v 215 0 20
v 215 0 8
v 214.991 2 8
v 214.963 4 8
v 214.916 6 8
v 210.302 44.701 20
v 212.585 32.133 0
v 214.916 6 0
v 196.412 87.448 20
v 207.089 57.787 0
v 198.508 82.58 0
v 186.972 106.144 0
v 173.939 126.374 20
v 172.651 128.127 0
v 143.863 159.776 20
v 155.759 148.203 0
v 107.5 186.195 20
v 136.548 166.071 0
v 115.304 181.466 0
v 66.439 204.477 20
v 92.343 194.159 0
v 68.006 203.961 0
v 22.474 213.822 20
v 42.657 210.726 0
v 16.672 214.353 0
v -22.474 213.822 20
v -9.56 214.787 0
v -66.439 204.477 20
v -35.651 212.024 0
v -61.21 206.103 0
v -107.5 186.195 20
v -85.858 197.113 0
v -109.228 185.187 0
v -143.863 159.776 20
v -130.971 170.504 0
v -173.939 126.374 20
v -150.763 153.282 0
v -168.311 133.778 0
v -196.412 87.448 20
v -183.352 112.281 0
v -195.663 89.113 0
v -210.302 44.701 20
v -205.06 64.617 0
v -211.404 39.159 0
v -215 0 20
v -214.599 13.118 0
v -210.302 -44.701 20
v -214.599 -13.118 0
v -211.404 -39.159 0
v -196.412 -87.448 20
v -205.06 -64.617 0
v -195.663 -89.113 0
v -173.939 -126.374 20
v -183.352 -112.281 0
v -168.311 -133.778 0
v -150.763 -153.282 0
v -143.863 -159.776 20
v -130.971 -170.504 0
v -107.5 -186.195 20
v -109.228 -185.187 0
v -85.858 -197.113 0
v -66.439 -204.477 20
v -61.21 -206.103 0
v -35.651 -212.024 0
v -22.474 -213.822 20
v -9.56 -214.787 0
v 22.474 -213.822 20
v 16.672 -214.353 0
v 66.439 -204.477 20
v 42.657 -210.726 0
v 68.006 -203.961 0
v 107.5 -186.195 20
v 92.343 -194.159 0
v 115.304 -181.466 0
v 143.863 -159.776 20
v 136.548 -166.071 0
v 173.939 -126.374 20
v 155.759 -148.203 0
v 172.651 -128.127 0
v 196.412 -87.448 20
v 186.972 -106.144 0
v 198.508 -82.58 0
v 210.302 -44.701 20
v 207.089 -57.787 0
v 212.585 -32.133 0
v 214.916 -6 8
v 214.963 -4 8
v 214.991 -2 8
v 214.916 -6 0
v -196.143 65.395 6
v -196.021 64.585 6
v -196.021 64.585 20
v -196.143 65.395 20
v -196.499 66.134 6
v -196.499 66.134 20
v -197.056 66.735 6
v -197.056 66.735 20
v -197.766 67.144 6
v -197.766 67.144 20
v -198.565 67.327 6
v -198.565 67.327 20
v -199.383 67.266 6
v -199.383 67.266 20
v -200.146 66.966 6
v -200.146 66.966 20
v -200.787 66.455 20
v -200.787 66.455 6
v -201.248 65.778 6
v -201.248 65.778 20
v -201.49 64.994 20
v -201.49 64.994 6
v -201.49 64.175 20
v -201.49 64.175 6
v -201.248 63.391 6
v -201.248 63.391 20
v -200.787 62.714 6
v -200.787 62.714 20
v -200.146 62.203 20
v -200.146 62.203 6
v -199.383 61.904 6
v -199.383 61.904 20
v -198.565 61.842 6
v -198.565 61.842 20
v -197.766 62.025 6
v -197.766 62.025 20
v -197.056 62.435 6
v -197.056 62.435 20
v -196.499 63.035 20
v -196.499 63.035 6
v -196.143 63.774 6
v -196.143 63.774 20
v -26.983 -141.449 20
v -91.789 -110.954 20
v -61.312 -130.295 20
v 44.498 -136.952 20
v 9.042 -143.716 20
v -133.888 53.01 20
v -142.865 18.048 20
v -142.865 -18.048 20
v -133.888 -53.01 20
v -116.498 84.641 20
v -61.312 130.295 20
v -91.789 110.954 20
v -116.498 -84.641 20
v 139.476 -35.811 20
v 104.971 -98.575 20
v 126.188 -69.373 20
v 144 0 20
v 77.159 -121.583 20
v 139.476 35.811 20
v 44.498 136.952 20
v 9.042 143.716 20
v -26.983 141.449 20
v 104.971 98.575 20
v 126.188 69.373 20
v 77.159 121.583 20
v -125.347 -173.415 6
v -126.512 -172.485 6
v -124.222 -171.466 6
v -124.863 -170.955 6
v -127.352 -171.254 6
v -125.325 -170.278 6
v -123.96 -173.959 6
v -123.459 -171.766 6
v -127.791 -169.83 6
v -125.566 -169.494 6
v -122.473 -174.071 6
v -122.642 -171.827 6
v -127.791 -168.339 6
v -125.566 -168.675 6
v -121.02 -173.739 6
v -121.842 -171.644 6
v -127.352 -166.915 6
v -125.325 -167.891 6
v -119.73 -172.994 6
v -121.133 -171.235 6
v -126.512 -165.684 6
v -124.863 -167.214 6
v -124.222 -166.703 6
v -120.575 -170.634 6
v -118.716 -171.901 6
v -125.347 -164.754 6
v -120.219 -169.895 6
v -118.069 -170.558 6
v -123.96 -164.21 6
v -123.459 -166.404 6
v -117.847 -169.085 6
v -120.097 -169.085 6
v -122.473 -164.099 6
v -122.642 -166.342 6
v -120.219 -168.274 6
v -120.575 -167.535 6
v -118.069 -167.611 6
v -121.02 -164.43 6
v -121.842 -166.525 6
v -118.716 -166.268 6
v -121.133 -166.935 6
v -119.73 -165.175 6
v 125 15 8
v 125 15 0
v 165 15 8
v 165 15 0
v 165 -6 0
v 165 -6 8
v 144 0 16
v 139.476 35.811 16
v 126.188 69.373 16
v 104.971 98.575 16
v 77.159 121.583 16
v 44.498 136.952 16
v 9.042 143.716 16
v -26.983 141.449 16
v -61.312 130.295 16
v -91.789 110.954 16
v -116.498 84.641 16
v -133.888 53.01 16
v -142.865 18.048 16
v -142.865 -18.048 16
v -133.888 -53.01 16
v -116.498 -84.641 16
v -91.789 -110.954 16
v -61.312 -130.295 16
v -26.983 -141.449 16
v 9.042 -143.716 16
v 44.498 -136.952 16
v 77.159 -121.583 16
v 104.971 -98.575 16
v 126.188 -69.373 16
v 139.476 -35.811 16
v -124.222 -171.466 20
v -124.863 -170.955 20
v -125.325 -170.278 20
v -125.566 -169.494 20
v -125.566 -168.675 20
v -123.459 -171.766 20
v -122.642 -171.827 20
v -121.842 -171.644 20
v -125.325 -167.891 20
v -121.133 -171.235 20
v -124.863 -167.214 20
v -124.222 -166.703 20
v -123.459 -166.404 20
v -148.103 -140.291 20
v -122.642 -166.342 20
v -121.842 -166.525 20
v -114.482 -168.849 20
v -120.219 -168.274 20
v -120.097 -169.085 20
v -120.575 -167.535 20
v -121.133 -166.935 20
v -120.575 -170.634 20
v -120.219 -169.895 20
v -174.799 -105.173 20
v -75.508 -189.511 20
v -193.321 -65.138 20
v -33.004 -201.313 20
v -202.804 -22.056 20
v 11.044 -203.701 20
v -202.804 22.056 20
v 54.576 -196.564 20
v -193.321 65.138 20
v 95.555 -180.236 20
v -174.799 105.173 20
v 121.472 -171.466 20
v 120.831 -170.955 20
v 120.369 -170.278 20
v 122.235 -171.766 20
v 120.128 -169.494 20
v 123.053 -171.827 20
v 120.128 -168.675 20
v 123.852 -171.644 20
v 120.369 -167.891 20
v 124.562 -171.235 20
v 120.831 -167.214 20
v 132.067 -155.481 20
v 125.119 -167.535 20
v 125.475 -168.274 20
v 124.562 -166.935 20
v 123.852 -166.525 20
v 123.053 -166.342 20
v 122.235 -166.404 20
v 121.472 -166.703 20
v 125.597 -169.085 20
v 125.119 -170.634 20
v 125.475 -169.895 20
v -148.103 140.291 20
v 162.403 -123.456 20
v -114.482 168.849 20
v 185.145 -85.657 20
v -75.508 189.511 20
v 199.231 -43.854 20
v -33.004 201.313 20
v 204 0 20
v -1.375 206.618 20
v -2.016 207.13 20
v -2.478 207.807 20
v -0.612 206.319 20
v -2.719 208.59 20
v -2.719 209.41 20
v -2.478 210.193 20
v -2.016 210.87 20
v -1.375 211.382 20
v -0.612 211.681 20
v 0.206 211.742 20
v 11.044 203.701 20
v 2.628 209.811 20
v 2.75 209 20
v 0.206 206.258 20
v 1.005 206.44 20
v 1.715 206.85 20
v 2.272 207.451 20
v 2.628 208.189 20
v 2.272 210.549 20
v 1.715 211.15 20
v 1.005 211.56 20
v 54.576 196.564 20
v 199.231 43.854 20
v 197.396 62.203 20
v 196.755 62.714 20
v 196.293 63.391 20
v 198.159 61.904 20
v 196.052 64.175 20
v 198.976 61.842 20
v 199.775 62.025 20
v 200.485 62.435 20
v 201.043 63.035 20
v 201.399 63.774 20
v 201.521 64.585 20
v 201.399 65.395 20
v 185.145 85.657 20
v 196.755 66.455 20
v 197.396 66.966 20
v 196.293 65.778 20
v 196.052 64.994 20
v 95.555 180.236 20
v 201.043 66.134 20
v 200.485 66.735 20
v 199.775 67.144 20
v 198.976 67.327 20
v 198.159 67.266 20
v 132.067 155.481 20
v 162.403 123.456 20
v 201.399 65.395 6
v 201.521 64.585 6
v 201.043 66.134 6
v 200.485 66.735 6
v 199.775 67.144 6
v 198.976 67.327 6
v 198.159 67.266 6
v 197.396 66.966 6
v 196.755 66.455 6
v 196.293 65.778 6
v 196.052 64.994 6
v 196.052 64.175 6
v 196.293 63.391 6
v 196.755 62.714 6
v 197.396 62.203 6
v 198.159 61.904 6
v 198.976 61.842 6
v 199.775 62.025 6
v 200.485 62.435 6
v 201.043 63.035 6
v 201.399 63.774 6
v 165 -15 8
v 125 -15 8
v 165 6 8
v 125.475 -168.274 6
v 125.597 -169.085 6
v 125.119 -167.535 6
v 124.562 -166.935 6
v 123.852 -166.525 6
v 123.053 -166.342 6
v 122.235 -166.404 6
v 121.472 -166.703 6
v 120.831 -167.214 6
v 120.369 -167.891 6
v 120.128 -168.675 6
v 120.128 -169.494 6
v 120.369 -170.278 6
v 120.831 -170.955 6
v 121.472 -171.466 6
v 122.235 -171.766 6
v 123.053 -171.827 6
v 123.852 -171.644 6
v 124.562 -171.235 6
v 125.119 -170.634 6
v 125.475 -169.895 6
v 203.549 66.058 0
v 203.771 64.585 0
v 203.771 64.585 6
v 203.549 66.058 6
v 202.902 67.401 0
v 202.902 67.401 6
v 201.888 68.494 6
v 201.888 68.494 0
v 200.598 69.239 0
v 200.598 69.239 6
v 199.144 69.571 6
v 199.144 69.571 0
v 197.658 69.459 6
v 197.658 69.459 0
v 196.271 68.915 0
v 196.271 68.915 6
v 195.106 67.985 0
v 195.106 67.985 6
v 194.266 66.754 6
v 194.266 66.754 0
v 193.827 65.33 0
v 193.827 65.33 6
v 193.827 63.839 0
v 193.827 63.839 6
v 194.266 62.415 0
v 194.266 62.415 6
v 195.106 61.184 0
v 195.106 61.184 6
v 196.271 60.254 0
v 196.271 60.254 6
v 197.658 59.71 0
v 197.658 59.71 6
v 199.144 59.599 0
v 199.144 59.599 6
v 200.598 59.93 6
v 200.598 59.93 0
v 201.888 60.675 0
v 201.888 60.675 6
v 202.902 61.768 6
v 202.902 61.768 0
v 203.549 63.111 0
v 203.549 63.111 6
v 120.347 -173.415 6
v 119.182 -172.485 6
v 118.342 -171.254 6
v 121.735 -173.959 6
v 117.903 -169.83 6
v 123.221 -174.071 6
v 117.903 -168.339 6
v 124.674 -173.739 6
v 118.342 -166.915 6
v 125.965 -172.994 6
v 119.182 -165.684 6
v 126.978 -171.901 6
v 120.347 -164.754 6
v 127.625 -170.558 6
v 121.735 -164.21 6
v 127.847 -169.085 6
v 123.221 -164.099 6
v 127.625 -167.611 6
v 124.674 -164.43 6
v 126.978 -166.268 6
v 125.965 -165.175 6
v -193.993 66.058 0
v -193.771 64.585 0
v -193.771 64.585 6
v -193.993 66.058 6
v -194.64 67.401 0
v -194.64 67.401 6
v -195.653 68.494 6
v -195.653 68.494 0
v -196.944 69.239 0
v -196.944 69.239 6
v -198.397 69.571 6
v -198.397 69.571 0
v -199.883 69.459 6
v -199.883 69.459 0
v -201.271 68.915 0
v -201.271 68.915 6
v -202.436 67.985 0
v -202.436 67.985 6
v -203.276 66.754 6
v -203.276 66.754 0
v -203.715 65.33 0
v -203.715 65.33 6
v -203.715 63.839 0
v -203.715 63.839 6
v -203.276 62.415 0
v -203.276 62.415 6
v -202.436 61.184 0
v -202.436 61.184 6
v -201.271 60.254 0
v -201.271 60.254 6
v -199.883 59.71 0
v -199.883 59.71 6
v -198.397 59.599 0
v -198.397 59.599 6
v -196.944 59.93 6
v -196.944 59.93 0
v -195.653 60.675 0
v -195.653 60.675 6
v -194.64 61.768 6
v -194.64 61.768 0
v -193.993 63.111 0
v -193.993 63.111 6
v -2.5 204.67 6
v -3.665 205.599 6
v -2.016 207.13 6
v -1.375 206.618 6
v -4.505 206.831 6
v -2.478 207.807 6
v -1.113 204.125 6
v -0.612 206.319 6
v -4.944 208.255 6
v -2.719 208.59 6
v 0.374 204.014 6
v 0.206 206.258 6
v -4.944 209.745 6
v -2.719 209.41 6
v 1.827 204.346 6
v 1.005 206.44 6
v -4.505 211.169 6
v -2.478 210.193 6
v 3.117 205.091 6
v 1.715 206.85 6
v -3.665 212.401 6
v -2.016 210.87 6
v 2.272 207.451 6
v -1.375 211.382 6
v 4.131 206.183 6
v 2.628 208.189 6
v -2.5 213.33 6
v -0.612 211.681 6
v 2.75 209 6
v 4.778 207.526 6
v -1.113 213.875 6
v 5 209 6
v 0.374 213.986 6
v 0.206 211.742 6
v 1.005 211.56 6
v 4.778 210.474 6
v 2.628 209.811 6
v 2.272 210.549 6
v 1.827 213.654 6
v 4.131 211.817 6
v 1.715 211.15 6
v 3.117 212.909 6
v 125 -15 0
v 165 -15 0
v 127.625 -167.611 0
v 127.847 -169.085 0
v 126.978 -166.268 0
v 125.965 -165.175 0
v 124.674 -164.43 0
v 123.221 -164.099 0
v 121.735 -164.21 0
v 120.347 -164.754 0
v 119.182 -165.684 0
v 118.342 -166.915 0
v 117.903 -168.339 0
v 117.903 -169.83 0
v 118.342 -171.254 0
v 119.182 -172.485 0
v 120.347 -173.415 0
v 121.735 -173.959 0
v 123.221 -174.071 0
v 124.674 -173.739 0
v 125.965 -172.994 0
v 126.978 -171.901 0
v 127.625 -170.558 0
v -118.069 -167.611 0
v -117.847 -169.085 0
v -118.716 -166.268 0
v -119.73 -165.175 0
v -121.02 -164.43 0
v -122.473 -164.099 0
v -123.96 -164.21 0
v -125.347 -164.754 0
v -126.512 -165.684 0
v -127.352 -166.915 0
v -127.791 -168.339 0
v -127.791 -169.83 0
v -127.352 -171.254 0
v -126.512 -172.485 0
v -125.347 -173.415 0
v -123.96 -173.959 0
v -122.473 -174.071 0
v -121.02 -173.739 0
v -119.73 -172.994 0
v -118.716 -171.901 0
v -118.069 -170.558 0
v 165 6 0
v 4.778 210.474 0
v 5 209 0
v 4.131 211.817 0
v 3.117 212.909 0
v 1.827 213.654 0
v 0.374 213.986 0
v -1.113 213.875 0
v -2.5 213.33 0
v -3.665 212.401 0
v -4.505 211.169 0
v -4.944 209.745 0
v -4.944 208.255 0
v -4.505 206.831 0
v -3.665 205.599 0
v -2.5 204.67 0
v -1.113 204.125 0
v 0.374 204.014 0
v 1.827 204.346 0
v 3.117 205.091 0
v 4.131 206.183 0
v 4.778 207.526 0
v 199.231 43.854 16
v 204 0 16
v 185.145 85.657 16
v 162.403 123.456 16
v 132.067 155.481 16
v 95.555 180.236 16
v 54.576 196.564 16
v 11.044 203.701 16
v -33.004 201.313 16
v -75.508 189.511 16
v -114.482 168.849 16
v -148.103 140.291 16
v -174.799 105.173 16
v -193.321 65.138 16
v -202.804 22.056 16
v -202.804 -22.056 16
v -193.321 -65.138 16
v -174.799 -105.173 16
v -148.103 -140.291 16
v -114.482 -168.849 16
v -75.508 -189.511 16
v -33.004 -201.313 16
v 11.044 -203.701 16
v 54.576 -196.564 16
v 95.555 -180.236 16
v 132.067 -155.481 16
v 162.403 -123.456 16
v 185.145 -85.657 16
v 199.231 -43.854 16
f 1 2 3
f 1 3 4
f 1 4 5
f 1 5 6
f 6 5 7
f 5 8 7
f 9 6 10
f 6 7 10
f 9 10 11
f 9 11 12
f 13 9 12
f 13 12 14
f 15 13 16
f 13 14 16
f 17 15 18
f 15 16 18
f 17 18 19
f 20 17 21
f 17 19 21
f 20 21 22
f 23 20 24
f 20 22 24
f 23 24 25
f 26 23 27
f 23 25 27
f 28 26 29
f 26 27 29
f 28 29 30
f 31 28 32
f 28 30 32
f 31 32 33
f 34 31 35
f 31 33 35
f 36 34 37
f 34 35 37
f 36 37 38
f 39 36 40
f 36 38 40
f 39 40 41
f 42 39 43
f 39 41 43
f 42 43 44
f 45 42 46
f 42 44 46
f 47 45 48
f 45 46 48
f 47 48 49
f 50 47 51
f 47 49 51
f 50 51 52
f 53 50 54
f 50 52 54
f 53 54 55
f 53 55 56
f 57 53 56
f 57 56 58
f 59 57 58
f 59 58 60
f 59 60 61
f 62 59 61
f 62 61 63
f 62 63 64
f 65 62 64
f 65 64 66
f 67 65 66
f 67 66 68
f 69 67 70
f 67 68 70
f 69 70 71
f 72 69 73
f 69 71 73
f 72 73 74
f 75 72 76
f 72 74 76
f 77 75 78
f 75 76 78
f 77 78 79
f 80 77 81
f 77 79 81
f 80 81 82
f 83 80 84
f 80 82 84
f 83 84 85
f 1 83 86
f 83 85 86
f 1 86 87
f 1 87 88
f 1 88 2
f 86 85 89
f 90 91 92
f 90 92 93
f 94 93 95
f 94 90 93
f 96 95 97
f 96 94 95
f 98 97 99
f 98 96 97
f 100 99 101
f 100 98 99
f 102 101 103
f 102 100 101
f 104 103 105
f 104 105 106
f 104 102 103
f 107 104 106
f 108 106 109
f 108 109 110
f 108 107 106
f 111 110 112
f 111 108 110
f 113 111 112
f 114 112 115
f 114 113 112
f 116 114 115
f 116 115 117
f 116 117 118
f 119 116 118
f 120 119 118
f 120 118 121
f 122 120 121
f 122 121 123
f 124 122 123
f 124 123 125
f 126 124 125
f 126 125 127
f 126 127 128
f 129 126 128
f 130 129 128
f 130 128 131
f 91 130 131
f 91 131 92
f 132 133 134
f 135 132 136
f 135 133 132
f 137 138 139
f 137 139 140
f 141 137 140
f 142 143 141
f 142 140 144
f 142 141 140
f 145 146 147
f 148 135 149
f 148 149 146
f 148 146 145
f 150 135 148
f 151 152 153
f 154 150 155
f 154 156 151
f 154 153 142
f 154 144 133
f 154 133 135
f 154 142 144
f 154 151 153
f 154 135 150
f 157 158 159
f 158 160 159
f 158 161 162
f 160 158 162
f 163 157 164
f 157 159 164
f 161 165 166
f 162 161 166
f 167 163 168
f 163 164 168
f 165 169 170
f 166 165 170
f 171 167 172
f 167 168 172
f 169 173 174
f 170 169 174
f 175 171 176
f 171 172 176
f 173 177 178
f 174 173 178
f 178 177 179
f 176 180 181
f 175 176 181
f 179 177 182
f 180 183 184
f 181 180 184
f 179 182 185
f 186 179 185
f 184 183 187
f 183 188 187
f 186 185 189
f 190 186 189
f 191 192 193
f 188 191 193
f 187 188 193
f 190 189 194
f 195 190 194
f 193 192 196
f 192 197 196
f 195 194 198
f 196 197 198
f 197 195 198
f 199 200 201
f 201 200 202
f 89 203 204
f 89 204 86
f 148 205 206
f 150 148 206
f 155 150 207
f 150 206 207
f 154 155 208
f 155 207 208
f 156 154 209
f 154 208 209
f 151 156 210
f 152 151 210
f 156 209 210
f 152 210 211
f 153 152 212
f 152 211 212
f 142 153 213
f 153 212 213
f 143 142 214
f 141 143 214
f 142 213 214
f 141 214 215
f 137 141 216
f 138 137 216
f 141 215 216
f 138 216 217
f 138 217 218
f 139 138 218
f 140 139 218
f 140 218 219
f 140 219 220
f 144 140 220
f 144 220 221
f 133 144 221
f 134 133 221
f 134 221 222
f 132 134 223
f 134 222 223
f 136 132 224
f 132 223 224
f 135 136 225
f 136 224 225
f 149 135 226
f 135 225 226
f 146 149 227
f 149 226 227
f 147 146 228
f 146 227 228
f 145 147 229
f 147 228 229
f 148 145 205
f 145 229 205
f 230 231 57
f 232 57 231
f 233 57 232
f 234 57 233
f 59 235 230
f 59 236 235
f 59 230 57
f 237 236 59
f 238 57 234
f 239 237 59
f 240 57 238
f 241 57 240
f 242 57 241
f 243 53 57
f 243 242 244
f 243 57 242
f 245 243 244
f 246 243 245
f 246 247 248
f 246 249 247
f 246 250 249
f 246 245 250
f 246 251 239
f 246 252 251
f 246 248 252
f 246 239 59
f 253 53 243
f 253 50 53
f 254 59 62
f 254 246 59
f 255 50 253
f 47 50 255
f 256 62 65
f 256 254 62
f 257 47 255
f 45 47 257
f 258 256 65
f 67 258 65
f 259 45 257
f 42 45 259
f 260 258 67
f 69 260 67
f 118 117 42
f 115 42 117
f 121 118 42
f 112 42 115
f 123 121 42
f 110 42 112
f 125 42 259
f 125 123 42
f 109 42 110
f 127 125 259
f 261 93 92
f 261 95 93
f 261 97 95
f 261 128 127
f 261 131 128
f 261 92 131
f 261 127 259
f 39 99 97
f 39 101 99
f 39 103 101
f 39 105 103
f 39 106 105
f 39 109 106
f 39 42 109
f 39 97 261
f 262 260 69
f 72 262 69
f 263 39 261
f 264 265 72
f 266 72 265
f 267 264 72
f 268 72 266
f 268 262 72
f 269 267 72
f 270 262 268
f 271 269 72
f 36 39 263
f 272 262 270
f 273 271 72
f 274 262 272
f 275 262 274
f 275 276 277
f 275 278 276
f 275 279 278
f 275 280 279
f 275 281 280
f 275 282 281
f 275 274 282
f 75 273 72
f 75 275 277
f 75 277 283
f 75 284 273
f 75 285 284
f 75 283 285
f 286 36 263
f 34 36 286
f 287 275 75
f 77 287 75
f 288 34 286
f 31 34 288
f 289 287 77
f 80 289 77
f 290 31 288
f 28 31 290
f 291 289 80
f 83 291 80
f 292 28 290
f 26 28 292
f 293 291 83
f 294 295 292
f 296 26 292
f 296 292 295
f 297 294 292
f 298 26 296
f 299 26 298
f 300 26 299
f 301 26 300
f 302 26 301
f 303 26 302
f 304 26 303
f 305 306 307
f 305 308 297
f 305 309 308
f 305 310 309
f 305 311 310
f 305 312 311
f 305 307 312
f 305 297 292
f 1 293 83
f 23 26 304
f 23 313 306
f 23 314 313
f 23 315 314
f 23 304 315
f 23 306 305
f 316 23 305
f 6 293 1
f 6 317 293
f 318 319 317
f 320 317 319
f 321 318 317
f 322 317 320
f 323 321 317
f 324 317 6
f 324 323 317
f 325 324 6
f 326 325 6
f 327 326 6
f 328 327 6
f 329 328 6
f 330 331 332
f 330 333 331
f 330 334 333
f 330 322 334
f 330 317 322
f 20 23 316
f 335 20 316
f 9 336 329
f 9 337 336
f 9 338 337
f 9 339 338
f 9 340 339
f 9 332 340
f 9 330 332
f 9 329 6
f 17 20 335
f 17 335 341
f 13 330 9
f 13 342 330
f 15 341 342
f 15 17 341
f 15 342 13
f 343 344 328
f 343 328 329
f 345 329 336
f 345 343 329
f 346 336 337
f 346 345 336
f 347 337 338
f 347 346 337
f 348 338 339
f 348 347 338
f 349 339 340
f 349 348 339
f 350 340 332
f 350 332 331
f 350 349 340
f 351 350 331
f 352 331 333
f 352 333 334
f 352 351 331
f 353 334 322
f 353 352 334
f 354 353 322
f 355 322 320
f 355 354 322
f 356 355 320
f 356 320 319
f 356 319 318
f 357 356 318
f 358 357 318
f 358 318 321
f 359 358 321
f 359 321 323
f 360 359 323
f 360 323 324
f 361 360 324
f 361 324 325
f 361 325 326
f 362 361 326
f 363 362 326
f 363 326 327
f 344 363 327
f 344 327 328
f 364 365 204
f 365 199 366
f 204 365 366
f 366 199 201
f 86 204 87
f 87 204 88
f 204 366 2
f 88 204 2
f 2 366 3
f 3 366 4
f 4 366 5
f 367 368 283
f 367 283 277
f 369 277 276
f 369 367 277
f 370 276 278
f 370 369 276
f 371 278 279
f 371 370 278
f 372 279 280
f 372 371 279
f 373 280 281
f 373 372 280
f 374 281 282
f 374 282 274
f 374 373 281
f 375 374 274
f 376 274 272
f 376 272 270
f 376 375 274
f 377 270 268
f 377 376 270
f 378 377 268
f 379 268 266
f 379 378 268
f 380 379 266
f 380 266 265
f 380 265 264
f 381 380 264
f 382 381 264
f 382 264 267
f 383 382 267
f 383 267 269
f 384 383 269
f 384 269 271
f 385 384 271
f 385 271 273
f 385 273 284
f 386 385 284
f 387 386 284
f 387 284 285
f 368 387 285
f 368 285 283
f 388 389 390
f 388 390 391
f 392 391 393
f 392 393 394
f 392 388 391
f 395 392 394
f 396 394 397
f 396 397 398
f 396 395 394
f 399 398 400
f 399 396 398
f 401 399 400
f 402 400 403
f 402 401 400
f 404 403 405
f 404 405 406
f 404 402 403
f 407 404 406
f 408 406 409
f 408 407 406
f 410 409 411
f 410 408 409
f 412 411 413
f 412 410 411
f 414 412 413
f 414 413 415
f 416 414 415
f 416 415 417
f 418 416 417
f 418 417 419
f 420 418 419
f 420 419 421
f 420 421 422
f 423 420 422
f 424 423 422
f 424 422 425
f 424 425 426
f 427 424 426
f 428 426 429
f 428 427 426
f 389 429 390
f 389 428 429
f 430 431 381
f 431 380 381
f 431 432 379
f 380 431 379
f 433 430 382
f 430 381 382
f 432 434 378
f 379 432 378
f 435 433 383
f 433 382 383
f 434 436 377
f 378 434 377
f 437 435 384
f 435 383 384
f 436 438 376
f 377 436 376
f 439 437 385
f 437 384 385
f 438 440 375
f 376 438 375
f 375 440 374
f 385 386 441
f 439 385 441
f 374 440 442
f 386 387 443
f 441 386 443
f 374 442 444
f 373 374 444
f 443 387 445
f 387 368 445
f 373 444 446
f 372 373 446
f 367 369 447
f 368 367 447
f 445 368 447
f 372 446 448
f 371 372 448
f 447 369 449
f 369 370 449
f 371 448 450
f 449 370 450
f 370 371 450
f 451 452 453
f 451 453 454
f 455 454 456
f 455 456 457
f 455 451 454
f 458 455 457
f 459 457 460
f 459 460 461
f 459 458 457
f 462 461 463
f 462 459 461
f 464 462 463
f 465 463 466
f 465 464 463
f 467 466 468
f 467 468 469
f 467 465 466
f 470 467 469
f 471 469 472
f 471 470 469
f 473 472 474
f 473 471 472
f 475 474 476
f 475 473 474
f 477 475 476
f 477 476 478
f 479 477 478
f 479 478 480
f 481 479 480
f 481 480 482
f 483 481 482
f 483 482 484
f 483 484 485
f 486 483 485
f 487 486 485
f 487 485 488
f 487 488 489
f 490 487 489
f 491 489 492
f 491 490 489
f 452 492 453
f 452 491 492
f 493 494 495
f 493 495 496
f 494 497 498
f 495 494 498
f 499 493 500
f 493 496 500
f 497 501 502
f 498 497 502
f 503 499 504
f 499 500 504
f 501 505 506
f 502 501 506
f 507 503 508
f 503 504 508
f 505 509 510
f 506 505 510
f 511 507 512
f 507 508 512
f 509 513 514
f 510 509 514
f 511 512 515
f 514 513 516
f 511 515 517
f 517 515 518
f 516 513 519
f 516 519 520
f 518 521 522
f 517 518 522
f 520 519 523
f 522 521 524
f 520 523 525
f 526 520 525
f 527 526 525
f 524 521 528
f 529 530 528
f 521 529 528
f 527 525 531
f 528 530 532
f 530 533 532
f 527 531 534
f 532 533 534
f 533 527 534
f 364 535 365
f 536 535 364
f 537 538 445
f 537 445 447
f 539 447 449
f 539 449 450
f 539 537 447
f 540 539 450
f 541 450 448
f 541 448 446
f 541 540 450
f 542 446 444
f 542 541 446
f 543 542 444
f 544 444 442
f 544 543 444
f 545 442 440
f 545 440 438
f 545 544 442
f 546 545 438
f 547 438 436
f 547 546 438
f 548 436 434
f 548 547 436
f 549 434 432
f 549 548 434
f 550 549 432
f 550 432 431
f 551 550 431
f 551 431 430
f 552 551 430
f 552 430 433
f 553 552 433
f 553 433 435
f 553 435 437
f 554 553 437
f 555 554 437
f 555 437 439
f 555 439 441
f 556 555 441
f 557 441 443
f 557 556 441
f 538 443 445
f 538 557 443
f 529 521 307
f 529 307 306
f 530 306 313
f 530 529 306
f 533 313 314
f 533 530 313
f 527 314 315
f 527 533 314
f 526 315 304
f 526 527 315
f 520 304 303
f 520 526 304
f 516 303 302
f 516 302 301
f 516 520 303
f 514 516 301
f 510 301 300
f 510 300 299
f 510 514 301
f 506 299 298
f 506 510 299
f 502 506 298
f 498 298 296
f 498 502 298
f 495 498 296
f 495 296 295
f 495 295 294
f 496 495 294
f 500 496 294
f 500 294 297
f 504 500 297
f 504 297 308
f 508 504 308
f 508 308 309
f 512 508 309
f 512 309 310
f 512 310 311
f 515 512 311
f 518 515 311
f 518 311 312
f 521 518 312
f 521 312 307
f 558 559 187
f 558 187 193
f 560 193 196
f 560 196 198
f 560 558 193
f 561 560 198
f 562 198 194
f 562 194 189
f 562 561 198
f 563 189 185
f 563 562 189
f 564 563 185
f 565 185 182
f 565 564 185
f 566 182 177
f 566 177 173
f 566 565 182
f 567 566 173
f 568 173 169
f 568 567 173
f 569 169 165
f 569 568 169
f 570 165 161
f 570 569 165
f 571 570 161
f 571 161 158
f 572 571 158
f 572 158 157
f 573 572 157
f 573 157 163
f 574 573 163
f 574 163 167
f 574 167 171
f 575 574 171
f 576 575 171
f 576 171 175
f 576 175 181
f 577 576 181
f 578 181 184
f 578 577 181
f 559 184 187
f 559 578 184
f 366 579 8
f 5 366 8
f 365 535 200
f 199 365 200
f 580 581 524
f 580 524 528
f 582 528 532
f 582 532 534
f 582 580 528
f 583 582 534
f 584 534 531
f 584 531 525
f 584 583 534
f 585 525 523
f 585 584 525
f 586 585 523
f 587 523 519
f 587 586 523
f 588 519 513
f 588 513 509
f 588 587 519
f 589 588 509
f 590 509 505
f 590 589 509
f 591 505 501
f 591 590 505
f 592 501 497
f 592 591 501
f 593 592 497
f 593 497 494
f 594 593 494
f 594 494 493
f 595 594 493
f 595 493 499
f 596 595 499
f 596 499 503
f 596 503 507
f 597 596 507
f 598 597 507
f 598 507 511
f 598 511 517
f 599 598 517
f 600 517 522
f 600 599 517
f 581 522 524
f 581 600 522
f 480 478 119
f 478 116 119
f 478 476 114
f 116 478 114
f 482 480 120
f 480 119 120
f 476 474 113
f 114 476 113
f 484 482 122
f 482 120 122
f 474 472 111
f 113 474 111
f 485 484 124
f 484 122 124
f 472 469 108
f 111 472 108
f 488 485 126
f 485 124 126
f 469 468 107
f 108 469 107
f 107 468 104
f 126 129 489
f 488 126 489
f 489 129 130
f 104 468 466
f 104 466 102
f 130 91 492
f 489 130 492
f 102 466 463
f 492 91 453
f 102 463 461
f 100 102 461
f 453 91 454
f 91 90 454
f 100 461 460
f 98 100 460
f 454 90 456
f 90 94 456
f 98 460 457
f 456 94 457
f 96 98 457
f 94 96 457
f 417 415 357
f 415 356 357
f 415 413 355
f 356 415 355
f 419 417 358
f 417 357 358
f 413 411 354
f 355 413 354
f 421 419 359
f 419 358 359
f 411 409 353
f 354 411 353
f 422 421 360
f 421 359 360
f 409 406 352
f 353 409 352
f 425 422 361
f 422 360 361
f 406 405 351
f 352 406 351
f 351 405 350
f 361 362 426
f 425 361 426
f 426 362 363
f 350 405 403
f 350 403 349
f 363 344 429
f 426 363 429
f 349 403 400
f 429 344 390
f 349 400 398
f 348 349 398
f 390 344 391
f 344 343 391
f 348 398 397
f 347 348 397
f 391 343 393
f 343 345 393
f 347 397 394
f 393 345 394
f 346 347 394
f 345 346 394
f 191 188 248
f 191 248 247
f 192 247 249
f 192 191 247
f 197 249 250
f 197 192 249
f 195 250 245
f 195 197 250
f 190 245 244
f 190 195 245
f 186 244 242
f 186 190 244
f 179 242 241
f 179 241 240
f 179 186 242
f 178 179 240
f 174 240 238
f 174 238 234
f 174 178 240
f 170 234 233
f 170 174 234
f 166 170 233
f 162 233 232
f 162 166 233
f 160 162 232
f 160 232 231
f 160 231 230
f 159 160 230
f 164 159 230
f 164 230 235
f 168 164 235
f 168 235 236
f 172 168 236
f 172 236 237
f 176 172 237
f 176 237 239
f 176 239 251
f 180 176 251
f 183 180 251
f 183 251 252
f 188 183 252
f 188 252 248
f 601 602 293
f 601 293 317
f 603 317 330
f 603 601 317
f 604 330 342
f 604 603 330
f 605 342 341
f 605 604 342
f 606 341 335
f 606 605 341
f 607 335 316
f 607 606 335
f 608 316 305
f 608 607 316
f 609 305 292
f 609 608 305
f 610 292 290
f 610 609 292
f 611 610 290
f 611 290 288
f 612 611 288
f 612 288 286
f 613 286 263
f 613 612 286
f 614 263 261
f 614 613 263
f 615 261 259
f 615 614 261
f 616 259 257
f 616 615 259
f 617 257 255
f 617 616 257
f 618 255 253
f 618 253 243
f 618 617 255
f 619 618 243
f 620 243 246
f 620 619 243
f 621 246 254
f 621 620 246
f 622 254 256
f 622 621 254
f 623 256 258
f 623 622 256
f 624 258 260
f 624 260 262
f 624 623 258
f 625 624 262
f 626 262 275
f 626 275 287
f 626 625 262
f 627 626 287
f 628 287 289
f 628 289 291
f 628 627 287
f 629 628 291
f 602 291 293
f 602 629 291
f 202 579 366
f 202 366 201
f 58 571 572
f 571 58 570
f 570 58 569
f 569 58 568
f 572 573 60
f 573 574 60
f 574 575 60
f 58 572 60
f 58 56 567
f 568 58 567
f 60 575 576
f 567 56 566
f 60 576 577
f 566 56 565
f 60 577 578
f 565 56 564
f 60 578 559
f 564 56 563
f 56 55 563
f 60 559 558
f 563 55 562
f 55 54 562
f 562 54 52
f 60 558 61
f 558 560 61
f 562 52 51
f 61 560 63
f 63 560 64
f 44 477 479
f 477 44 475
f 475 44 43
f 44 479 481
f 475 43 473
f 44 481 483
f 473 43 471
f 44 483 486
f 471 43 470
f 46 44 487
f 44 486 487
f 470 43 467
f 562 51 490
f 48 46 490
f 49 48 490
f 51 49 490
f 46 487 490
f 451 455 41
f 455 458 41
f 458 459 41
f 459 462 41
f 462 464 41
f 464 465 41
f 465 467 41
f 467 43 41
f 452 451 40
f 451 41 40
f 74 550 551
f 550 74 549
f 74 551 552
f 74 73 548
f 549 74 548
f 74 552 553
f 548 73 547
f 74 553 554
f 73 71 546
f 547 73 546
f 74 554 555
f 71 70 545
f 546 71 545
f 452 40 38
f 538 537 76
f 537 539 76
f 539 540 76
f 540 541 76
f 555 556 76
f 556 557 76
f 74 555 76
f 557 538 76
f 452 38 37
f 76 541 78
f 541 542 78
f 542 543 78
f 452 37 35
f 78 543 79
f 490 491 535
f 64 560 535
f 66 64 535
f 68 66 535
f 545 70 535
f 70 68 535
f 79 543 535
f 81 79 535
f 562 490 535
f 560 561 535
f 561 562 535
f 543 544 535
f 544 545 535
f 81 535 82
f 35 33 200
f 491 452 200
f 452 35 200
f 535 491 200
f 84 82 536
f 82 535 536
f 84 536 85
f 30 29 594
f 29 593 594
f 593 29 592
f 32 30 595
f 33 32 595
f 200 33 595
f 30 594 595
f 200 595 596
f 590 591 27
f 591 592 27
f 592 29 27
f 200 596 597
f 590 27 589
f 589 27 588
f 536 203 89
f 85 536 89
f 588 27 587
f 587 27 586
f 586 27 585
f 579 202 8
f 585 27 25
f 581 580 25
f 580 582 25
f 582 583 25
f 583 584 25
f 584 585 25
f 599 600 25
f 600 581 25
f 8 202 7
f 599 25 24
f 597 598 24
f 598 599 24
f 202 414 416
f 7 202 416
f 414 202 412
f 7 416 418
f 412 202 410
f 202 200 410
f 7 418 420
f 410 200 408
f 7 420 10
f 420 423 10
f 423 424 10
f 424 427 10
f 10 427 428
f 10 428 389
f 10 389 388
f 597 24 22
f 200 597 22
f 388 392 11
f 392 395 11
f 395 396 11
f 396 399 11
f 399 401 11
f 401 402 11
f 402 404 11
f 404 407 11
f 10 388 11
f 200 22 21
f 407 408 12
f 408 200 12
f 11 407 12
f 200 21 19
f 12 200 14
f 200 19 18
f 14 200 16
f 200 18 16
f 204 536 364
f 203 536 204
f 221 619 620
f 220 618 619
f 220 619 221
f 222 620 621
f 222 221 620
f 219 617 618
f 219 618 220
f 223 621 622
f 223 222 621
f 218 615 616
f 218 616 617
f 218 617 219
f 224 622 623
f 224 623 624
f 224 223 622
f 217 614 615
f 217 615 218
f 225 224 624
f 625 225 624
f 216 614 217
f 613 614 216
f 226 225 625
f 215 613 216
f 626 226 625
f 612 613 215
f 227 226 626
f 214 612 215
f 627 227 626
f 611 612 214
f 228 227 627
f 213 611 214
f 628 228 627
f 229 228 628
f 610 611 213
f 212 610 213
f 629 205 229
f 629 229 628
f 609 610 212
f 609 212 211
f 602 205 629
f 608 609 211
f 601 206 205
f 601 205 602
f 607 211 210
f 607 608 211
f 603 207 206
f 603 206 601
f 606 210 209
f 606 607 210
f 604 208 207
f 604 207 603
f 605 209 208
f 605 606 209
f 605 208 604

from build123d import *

# Parameters (mm, degrees)
SKETCH1_R           = 215
PLATE_DEPTH         = 20
SKETCH2_R           = 204
SKETCH2_R_2         = 144
COMB_GROOVE_DEPTH   = 4
SKETCH3_R           = 2.75
ROD_HOLES_DEPTH     = 20
SKETCH4_R           = 5
NUT_POCKETS_DEPTH   = 6
SKETCH5_W           = 40
SKETCH5_H           = 30
PD_POCKET_DEPTH     = 8
SKETCH6_W           = 60
SKETCH6_H           = 12
CABLE_CHANNEL_DEPTH = 8


with BuildPart() as part:
    # Sketch1 → Plate (new body)
    with BuildSketch(Plane.XY):
        Circle(SKETCH1_R)
    extrude(amount=PLATE_DEPTH)

    # Sketch2 → Comb_groove (cut)
    with BuildSketch(Plane.XY.offset(16)):
        Circle(SKETCH2_R)
        Circle(SKETCH2_R_2, mode=Mode.SUBTRACT)
    extrude(amount=COMB_GROOVE_DEPTH, mode=Mode.SUBTRACT)

    # Sketch3 → Rod_holes (cut)
    with BuildSketch(Plane.XY):
        with Locations((198.770811906, 64.584551824)):
            Circle(SKETCH3_R)
        with Locations((0, 209)):
            Circle(SKETCH3_R)
        with Locations((-198.770811906, 64.584551824)):
            Circle(SKETCH3_R)
        with Locations((-122.847117729, -169.084551824)):
            Circle(SKETCH3_R)
        with Locations((122.847117729, -169.084551824)):
            Circle(SKETCH3_R)
    extrude(amount=ROD_HOLES_DEPTH, mode=Mode.SUBTRACT)

    # Sketch4 → Nut_pockets (cut)
    with BuildSketch(Plane.XY):
        with Locations((198.770811906, 64.584551824)):
            Circle(SKETCH4_R)
        with Locations((0, 209)):
            Circle(SKETCH4_R)
        with Locations((-198.770811906, 64.584551824)):
            Circle(SKETCH4_R)
        with Locations((-122.847117729, -169.084551824)):
            Circle(SKETCH4_R)
        with Locations((122.847117729, -169.084551824)):
            Circle(SKETCH4_R)
    extrude(amount=NUT_POCKETS_DEPTH, mode=Mode.SUBTRACT)

    # Sketch5 → PD_pocket (cut)
    with BuildSketch(Plane.XY):
        with Locations((145, 0)):
            Rectangle(SKETCH5_W, SKETCH5_H)
    extrude(amount=PD_POCKET_DEPTH, mode=Mode.SUBTRACT)

    # Sketch6 → Cable_channel (cut)
    with BuildSketch(Plane.XY):
        with Locations((190, 0)):
            Rectangle(SKETCH6_W, SKETCH6_H)
    extrude(amount=CABLE_CHANNEL_DEPTH, mode=Mode.SUBTRACT)


solid = part.part
